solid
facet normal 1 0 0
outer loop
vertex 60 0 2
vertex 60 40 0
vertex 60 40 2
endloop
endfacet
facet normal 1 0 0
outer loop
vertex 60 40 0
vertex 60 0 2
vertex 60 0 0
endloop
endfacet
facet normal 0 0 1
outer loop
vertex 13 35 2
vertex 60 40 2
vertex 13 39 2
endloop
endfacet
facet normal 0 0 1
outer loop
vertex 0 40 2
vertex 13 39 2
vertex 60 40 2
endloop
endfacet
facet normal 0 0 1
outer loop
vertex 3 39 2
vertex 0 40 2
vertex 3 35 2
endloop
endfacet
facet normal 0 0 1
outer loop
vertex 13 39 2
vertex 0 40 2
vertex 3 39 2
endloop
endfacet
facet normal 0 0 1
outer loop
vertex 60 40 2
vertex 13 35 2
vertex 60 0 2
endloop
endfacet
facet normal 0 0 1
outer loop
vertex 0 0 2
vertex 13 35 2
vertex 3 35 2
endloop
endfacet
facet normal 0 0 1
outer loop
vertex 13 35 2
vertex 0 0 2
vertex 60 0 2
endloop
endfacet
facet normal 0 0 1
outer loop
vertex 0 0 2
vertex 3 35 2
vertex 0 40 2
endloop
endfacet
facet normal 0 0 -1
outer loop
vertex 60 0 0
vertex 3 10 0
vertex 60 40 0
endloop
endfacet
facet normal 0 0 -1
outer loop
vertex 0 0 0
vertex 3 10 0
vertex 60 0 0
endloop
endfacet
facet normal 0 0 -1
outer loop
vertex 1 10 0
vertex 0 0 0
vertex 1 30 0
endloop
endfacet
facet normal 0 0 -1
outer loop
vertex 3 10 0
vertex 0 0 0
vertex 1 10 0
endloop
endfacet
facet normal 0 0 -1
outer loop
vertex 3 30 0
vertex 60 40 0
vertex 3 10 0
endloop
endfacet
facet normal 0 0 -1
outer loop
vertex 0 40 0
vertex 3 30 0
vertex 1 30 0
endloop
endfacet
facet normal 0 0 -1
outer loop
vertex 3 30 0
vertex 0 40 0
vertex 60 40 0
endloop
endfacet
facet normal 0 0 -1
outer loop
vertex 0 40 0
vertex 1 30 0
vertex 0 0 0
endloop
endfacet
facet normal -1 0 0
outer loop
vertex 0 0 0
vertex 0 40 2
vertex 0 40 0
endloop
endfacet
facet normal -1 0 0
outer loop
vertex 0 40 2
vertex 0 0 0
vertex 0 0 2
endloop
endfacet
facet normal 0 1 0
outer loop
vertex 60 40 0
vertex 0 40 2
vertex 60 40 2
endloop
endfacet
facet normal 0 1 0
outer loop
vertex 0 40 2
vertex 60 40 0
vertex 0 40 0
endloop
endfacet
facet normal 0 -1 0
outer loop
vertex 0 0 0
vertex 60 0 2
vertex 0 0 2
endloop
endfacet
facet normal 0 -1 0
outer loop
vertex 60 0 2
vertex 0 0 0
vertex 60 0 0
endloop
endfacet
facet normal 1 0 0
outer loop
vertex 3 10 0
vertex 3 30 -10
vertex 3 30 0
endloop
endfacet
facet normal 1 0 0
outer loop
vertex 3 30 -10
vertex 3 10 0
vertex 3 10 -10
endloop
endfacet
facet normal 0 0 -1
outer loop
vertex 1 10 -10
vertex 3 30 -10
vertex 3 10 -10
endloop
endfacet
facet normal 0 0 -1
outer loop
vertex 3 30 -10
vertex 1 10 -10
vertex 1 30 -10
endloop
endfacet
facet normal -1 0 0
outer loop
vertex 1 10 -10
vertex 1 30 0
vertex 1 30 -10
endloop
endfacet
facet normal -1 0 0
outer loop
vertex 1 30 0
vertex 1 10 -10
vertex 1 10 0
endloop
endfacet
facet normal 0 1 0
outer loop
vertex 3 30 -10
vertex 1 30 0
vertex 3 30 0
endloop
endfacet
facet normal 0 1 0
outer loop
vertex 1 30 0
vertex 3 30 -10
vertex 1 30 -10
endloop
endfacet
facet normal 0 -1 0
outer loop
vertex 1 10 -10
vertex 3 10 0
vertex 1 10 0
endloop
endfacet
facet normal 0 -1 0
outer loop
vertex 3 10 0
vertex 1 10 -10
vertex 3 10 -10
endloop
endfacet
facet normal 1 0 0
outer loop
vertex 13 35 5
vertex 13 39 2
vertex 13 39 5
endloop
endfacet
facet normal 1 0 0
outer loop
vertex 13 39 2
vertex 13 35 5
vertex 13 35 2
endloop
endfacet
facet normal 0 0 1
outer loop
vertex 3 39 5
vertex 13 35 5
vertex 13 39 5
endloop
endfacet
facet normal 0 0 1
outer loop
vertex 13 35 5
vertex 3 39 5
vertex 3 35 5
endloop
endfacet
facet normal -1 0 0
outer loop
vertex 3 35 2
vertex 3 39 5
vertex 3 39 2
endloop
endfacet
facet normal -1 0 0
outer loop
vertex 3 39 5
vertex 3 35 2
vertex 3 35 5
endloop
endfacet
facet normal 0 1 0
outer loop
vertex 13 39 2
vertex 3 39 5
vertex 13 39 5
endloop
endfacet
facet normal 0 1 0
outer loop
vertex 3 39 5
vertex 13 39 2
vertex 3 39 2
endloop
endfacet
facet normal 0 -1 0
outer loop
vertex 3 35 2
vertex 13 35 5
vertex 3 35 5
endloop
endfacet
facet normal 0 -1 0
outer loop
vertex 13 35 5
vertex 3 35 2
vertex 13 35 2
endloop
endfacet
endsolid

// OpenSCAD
module RFID_RC522() {
	color([0, 0.6, 0.8]) translate([0,0,0]) cube([60,40,2]); //pcb	
	color([0.3, 0.3, 0.3]) translate([1,10,-10]) cube([2, 20, 12]); //header
	color([0.8, 0.8, 0.8]) translate([3,35,2]) cube([10, 4, 3]); //resonator
}

RFID_RC522();
